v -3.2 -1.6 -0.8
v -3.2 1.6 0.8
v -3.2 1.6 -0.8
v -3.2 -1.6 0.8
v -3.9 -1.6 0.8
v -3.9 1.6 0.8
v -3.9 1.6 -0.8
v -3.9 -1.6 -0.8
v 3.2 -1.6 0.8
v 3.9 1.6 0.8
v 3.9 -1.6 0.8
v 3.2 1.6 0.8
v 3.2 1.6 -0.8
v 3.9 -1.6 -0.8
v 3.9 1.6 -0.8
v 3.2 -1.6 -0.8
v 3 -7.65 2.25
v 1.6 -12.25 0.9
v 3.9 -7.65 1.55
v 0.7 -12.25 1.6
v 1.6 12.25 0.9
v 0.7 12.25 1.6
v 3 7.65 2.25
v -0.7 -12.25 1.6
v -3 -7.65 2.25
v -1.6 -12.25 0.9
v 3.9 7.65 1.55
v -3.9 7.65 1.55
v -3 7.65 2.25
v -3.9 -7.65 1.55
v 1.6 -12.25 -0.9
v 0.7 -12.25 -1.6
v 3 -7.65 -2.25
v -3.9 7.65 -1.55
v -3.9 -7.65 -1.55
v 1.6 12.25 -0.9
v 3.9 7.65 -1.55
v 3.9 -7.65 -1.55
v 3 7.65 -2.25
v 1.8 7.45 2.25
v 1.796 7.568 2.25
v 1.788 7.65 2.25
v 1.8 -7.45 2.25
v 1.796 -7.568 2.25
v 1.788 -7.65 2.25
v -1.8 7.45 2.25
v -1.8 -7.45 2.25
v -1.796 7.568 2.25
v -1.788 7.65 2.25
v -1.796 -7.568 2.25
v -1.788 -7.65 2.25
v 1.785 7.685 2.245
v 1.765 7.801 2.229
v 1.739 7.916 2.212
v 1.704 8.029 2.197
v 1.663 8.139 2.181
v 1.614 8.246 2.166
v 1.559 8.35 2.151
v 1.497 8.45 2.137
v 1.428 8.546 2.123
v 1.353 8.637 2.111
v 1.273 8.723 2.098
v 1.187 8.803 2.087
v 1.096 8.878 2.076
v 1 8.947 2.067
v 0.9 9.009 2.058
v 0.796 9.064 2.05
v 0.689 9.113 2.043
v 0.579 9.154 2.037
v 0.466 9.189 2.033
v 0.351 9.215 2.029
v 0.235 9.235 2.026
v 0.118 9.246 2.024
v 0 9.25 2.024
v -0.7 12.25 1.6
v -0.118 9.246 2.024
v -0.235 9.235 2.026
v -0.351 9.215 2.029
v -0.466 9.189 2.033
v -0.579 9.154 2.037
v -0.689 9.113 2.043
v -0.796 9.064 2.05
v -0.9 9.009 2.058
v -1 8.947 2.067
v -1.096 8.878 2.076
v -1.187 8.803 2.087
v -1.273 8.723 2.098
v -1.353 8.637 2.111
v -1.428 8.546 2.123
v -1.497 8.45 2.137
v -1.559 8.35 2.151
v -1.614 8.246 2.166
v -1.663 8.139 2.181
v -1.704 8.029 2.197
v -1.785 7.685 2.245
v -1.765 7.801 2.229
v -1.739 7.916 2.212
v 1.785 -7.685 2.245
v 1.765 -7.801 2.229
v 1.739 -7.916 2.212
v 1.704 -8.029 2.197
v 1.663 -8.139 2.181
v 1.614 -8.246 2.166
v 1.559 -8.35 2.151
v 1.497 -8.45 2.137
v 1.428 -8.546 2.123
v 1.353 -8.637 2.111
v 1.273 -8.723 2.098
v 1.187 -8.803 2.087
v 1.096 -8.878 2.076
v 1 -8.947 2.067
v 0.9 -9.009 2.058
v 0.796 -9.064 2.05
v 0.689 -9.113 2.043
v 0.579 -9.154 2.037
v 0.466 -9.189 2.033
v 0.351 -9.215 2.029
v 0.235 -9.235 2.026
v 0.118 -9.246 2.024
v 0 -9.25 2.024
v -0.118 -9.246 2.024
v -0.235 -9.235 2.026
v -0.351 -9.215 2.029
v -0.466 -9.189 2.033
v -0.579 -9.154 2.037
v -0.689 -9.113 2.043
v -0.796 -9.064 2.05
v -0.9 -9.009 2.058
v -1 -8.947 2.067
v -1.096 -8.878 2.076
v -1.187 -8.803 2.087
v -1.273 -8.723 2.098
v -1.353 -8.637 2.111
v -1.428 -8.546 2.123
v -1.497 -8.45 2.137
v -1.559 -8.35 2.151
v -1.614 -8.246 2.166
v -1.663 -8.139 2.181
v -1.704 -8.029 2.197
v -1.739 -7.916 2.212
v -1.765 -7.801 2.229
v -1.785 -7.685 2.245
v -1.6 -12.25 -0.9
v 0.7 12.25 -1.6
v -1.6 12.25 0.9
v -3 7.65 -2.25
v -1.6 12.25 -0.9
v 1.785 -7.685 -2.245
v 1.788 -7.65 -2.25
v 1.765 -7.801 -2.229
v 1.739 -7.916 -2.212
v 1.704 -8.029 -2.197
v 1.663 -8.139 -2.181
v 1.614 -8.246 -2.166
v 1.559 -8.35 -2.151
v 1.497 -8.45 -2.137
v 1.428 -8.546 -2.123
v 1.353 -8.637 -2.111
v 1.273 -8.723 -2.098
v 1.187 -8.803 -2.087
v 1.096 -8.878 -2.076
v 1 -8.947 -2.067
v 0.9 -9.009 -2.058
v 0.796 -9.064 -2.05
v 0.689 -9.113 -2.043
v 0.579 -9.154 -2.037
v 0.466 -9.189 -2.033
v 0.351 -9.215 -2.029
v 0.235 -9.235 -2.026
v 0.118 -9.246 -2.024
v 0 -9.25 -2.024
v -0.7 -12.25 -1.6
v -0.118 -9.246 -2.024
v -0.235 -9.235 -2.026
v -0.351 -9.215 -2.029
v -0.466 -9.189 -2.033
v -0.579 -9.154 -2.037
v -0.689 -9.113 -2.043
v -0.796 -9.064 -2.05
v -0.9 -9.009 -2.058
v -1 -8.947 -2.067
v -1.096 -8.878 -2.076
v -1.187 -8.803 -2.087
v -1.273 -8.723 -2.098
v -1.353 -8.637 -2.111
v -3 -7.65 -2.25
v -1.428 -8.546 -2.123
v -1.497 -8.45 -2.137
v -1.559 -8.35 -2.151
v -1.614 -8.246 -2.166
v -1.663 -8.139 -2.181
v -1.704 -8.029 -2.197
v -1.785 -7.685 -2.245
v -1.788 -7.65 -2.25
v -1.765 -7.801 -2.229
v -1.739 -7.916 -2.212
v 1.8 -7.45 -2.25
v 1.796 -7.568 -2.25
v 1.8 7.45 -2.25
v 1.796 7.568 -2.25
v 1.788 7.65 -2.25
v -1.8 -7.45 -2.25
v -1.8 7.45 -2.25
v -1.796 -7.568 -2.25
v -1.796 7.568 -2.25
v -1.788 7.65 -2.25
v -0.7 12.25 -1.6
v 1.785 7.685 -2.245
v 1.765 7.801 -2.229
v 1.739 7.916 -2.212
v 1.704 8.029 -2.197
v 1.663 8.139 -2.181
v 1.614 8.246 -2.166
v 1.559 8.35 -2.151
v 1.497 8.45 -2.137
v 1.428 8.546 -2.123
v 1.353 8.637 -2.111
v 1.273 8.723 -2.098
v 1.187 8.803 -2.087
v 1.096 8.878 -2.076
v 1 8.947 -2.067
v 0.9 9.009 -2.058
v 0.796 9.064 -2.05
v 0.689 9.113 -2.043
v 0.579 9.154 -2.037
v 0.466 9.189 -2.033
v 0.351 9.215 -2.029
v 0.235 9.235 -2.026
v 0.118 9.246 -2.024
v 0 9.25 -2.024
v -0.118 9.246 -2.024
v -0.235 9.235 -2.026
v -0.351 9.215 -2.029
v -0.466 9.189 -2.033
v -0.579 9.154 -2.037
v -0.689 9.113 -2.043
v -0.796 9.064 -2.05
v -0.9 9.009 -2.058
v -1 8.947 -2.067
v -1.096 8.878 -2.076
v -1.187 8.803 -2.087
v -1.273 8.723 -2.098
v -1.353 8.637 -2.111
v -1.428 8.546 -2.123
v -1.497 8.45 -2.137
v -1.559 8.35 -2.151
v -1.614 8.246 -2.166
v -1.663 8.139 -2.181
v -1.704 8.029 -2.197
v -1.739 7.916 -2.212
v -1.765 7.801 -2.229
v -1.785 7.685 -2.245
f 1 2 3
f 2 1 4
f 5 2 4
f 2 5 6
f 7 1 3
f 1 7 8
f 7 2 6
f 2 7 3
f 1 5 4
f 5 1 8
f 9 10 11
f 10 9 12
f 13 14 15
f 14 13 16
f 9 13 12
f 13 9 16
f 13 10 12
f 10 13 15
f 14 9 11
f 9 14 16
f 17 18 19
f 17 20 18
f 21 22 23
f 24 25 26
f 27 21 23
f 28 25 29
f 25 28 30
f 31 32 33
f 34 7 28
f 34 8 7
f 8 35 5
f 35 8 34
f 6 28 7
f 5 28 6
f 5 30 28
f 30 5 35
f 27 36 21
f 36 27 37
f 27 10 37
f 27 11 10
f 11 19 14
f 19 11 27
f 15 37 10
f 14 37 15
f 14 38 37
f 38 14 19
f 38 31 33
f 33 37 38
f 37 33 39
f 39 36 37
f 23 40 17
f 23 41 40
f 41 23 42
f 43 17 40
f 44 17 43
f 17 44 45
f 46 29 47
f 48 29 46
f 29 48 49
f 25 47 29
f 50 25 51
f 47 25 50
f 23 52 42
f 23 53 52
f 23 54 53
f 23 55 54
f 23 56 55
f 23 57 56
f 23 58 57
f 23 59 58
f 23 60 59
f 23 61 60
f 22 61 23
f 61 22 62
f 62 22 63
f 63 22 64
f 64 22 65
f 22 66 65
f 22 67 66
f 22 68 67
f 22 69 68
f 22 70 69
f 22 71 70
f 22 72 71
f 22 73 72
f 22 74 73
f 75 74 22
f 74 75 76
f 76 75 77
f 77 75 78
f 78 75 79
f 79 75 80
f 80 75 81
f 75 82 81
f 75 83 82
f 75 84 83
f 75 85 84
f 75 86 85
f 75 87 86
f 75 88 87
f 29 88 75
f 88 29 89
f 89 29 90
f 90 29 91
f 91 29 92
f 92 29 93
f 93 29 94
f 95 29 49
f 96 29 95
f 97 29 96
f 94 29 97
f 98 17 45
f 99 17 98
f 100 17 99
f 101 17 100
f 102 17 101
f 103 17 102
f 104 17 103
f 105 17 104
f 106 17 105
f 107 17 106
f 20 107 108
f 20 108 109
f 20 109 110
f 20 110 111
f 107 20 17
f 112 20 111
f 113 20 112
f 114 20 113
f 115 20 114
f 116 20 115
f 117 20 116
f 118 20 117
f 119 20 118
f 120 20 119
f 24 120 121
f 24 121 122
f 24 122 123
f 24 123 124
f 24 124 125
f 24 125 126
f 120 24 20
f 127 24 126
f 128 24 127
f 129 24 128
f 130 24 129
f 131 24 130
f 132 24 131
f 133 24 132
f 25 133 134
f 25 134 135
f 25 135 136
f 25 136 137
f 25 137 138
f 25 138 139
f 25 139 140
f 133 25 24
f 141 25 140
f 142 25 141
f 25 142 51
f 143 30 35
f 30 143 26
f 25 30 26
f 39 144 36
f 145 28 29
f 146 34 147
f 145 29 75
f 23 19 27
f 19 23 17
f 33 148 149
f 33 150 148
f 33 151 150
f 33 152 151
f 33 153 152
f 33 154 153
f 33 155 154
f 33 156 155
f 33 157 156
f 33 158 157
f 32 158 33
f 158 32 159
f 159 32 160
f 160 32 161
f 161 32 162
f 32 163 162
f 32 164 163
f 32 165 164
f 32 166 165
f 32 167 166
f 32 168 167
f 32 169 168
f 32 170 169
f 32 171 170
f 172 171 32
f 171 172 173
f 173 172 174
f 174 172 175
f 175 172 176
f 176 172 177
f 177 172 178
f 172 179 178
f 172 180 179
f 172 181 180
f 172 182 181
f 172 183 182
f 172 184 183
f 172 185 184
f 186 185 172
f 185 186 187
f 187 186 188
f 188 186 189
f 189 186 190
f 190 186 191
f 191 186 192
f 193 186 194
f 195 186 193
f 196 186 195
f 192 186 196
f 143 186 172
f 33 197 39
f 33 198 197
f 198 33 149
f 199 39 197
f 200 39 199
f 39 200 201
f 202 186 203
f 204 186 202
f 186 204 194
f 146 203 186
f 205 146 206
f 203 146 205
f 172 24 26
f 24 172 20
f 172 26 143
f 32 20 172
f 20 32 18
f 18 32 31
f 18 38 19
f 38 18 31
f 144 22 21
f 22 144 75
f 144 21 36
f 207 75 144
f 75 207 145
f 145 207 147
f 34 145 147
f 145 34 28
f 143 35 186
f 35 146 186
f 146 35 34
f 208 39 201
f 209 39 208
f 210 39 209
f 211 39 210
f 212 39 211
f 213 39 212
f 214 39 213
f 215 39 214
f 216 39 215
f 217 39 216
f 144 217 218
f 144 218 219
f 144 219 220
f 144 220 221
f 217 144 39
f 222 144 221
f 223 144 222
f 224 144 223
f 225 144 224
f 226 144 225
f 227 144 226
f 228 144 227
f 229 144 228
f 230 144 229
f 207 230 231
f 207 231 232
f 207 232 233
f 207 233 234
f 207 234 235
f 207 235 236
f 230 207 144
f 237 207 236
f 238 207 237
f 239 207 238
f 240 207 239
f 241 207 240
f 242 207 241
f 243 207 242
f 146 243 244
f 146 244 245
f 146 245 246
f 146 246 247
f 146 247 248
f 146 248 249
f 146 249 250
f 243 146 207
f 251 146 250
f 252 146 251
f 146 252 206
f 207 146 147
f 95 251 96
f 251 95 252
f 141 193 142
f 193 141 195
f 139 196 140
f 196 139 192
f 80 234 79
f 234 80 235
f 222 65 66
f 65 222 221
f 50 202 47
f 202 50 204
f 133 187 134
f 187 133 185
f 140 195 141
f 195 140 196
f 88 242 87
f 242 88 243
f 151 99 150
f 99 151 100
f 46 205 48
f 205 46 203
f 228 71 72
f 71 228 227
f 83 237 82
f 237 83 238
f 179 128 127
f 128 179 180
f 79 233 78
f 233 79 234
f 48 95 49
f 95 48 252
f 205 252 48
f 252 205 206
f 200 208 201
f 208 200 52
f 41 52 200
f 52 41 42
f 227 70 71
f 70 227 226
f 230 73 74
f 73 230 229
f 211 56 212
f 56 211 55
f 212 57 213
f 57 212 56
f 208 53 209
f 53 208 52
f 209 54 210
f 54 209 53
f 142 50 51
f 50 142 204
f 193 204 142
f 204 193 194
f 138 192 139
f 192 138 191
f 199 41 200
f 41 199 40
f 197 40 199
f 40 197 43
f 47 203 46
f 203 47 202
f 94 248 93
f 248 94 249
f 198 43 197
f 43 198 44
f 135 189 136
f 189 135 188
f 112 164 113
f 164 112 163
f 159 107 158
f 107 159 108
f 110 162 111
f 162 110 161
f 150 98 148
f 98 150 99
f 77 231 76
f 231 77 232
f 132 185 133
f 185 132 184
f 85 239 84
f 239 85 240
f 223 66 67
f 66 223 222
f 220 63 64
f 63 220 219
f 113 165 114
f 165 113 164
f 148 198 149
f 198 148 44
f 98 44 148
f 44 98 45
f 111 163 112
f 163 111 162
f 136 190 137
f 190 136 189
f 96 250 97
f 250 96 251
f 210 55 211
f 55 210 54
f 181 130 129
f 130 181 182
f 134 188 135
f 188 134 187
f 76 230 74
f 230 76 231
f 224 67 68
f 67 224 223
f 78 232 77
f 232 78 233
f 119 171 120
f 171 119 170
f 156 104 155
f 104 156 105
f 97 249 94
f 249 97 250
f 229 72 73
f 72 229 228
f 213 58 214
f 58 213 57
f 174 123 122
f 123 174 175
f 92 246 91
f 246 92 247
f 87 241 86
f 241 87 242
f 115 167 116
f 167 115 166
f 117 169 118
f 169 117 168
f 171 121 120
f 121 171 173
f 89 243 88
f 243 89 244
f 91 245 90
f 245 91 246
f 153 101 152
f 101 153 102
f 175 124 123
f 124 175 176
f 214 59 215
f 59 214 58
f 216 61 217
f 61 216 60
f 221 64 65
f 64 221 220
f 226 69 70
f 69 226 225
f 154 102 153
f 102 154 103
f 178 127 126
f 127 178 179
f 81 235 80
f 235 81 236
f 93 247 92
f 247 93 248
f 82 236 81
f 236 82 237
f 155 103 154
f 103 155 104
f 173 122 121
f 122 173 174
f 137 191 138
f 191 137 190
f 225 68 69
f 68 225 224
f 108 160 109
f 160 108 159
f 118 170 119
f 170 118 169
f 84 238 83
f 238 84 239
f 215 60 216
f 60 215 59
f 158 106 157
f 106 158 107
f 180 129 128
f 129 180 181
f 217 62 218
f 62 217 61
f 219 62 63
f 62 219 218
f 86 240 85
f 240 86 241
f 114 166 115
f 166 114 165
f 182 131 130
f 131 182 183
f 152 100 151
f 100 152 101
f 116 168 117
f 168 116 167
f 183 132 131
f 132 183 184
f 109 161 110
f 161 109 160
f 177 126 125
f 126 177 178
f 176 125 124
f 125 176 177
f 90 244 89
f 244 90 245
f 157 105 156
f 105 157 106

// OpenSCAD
$fn = 96;

// Target bounding box (X x Y x Z): 7.8 x 24.5 x 4.5 mm
L = 24.5;          // overall length (Y)
W = 7.8;           // overall width  (X)
H = 4.5;           // overall height (Z)

// End tapers (double-pointed)
tip_len = 4.6;                 // length of each pointed end along Y
mid_len = L - 2*tip_len;
tip_w   = 3.2;                 // width at very tip (X)
tip_h   = 3.2;                 // height at very tip (Z)

// Faceting / chamfers (make outer body clearly non-prismatic)
chamfer_x = 0.9;               // side chamfer amount (in X)
chamfer_z = 0.7;               // top/bottom chamfer amount (in Z)

// Through-slot (obround / closed-loop opening)
slot_L = 18.5;                 // overall slot length (Y)
slot_W = 3.6;                  // slot width (X)

// Side notches (two shallow rectangular notches near mid-length)
notch_L = 3.2;                 // along Y
notch_D = 0.7;                 // depth into side (along X)
notch_H = 1.6;                 // notch height (along Z)
notch_y = 0;                   // centered at mid-length

// Small top flat/mark (kept subtle)
mark_flat_W = 1.2;
mark_flat_L = 2.0;
mark_flat_D = 0.25;
mark_flat_offset_y = 0;

// Robust boolean overlap
eps = 0.02;

// ---------- Helpers ----------
module obround_2d(len, wid) {
    r = wid/2;
    hull() {
        translate([0,  len/2 - r]) circle(r=r);
        translate([0, -len/2 + r]) circle(r=r);
    }
}

module slot_3d() {
    // Extrude along Z; 2D is in XY with length along Y and width along X
    linear_extrude(height=H + 2*eps, center=true)
        obround_2d(slot_L, slot_W);
}

module faceted_section(xw, yh, zh) {
    // Faceted/chamfered prism via hull of 3 rectangles:
    // - full size at mid Z
    // - reduced in X at top/bottom (side chamfers)
    // - reduced in Z at left/right (top/bottom chamfers)
    // This yields clearly angled outer faces without changing the bounding box.
    hull() {
        // Mid plane: full
        cube([xw, yh, eps], center=true);

        // Top & bottom: reduced X (side chamfers)
        translate([0, 0,  zh/2 - eps/2])
            cube([max(0.01, xw - 2*chamfer_x), yh, eps], center=true);
        translate([0, 0, -zh/2 + eps/2])
            cube([max(0.01, xw - 2*chamfer_x), yh, eps], center=true);

        // Left & right: reduced Z (top/bottom chamfers)
        translate([ xw/2 - eps/2, 0, 0])
            cube([eps, yh, max(0.01, zh - 2*chamfer_z)], center=true);
        translate([-xw/2 + eps/2, 0, 0])
            cube([eps, yh, max(0.01, zh - 2*chamfer_z)], center=true);
    }
}

module outer_spindle() {
    // Faceted spindle: hull of three faceted cross-sections (mid + two tips)
    hull() {
        // Mid body (full W,H)
        faceted_section(W, mid_len, H);

        // Front tip (reduced W,H)
        translate([0,  mid_len/2 + tip_len/2, 0])
            faceted_section(tip_w, tip_len, tip_h);

        // Back tip (reduced W,H)
        translate([0, -(mid_len/2 + tip_len/2), 0])
            faceted_section(tip_w, tip_len, tip_h);
    }
}

module side_notches() {
    // Cut into left/right sides; ensure they intersect the outer body
    // and are visible in orthographic views.
    for (sx = [-1, 1]) {
        translate([ sx*(W/2 - notch_D/2 + eps), notch_y, 0])
            cube([notch_D + 2*eps, notch_L, notch_H], center=true);
    }
}

module top_mark_flat() {
    translate([0, mark_flat_offset_y, H/2 - mark_flat_D/2 + eps])
        cube([mark_flat_W, mark_flat_L, mark_flat_D + 2*eps], center=true);
}

// ---------- Final model ----------
difference() {
    outer_spindle();
    slot_3d();
    side_notches();
    top_mark_flat();
}
